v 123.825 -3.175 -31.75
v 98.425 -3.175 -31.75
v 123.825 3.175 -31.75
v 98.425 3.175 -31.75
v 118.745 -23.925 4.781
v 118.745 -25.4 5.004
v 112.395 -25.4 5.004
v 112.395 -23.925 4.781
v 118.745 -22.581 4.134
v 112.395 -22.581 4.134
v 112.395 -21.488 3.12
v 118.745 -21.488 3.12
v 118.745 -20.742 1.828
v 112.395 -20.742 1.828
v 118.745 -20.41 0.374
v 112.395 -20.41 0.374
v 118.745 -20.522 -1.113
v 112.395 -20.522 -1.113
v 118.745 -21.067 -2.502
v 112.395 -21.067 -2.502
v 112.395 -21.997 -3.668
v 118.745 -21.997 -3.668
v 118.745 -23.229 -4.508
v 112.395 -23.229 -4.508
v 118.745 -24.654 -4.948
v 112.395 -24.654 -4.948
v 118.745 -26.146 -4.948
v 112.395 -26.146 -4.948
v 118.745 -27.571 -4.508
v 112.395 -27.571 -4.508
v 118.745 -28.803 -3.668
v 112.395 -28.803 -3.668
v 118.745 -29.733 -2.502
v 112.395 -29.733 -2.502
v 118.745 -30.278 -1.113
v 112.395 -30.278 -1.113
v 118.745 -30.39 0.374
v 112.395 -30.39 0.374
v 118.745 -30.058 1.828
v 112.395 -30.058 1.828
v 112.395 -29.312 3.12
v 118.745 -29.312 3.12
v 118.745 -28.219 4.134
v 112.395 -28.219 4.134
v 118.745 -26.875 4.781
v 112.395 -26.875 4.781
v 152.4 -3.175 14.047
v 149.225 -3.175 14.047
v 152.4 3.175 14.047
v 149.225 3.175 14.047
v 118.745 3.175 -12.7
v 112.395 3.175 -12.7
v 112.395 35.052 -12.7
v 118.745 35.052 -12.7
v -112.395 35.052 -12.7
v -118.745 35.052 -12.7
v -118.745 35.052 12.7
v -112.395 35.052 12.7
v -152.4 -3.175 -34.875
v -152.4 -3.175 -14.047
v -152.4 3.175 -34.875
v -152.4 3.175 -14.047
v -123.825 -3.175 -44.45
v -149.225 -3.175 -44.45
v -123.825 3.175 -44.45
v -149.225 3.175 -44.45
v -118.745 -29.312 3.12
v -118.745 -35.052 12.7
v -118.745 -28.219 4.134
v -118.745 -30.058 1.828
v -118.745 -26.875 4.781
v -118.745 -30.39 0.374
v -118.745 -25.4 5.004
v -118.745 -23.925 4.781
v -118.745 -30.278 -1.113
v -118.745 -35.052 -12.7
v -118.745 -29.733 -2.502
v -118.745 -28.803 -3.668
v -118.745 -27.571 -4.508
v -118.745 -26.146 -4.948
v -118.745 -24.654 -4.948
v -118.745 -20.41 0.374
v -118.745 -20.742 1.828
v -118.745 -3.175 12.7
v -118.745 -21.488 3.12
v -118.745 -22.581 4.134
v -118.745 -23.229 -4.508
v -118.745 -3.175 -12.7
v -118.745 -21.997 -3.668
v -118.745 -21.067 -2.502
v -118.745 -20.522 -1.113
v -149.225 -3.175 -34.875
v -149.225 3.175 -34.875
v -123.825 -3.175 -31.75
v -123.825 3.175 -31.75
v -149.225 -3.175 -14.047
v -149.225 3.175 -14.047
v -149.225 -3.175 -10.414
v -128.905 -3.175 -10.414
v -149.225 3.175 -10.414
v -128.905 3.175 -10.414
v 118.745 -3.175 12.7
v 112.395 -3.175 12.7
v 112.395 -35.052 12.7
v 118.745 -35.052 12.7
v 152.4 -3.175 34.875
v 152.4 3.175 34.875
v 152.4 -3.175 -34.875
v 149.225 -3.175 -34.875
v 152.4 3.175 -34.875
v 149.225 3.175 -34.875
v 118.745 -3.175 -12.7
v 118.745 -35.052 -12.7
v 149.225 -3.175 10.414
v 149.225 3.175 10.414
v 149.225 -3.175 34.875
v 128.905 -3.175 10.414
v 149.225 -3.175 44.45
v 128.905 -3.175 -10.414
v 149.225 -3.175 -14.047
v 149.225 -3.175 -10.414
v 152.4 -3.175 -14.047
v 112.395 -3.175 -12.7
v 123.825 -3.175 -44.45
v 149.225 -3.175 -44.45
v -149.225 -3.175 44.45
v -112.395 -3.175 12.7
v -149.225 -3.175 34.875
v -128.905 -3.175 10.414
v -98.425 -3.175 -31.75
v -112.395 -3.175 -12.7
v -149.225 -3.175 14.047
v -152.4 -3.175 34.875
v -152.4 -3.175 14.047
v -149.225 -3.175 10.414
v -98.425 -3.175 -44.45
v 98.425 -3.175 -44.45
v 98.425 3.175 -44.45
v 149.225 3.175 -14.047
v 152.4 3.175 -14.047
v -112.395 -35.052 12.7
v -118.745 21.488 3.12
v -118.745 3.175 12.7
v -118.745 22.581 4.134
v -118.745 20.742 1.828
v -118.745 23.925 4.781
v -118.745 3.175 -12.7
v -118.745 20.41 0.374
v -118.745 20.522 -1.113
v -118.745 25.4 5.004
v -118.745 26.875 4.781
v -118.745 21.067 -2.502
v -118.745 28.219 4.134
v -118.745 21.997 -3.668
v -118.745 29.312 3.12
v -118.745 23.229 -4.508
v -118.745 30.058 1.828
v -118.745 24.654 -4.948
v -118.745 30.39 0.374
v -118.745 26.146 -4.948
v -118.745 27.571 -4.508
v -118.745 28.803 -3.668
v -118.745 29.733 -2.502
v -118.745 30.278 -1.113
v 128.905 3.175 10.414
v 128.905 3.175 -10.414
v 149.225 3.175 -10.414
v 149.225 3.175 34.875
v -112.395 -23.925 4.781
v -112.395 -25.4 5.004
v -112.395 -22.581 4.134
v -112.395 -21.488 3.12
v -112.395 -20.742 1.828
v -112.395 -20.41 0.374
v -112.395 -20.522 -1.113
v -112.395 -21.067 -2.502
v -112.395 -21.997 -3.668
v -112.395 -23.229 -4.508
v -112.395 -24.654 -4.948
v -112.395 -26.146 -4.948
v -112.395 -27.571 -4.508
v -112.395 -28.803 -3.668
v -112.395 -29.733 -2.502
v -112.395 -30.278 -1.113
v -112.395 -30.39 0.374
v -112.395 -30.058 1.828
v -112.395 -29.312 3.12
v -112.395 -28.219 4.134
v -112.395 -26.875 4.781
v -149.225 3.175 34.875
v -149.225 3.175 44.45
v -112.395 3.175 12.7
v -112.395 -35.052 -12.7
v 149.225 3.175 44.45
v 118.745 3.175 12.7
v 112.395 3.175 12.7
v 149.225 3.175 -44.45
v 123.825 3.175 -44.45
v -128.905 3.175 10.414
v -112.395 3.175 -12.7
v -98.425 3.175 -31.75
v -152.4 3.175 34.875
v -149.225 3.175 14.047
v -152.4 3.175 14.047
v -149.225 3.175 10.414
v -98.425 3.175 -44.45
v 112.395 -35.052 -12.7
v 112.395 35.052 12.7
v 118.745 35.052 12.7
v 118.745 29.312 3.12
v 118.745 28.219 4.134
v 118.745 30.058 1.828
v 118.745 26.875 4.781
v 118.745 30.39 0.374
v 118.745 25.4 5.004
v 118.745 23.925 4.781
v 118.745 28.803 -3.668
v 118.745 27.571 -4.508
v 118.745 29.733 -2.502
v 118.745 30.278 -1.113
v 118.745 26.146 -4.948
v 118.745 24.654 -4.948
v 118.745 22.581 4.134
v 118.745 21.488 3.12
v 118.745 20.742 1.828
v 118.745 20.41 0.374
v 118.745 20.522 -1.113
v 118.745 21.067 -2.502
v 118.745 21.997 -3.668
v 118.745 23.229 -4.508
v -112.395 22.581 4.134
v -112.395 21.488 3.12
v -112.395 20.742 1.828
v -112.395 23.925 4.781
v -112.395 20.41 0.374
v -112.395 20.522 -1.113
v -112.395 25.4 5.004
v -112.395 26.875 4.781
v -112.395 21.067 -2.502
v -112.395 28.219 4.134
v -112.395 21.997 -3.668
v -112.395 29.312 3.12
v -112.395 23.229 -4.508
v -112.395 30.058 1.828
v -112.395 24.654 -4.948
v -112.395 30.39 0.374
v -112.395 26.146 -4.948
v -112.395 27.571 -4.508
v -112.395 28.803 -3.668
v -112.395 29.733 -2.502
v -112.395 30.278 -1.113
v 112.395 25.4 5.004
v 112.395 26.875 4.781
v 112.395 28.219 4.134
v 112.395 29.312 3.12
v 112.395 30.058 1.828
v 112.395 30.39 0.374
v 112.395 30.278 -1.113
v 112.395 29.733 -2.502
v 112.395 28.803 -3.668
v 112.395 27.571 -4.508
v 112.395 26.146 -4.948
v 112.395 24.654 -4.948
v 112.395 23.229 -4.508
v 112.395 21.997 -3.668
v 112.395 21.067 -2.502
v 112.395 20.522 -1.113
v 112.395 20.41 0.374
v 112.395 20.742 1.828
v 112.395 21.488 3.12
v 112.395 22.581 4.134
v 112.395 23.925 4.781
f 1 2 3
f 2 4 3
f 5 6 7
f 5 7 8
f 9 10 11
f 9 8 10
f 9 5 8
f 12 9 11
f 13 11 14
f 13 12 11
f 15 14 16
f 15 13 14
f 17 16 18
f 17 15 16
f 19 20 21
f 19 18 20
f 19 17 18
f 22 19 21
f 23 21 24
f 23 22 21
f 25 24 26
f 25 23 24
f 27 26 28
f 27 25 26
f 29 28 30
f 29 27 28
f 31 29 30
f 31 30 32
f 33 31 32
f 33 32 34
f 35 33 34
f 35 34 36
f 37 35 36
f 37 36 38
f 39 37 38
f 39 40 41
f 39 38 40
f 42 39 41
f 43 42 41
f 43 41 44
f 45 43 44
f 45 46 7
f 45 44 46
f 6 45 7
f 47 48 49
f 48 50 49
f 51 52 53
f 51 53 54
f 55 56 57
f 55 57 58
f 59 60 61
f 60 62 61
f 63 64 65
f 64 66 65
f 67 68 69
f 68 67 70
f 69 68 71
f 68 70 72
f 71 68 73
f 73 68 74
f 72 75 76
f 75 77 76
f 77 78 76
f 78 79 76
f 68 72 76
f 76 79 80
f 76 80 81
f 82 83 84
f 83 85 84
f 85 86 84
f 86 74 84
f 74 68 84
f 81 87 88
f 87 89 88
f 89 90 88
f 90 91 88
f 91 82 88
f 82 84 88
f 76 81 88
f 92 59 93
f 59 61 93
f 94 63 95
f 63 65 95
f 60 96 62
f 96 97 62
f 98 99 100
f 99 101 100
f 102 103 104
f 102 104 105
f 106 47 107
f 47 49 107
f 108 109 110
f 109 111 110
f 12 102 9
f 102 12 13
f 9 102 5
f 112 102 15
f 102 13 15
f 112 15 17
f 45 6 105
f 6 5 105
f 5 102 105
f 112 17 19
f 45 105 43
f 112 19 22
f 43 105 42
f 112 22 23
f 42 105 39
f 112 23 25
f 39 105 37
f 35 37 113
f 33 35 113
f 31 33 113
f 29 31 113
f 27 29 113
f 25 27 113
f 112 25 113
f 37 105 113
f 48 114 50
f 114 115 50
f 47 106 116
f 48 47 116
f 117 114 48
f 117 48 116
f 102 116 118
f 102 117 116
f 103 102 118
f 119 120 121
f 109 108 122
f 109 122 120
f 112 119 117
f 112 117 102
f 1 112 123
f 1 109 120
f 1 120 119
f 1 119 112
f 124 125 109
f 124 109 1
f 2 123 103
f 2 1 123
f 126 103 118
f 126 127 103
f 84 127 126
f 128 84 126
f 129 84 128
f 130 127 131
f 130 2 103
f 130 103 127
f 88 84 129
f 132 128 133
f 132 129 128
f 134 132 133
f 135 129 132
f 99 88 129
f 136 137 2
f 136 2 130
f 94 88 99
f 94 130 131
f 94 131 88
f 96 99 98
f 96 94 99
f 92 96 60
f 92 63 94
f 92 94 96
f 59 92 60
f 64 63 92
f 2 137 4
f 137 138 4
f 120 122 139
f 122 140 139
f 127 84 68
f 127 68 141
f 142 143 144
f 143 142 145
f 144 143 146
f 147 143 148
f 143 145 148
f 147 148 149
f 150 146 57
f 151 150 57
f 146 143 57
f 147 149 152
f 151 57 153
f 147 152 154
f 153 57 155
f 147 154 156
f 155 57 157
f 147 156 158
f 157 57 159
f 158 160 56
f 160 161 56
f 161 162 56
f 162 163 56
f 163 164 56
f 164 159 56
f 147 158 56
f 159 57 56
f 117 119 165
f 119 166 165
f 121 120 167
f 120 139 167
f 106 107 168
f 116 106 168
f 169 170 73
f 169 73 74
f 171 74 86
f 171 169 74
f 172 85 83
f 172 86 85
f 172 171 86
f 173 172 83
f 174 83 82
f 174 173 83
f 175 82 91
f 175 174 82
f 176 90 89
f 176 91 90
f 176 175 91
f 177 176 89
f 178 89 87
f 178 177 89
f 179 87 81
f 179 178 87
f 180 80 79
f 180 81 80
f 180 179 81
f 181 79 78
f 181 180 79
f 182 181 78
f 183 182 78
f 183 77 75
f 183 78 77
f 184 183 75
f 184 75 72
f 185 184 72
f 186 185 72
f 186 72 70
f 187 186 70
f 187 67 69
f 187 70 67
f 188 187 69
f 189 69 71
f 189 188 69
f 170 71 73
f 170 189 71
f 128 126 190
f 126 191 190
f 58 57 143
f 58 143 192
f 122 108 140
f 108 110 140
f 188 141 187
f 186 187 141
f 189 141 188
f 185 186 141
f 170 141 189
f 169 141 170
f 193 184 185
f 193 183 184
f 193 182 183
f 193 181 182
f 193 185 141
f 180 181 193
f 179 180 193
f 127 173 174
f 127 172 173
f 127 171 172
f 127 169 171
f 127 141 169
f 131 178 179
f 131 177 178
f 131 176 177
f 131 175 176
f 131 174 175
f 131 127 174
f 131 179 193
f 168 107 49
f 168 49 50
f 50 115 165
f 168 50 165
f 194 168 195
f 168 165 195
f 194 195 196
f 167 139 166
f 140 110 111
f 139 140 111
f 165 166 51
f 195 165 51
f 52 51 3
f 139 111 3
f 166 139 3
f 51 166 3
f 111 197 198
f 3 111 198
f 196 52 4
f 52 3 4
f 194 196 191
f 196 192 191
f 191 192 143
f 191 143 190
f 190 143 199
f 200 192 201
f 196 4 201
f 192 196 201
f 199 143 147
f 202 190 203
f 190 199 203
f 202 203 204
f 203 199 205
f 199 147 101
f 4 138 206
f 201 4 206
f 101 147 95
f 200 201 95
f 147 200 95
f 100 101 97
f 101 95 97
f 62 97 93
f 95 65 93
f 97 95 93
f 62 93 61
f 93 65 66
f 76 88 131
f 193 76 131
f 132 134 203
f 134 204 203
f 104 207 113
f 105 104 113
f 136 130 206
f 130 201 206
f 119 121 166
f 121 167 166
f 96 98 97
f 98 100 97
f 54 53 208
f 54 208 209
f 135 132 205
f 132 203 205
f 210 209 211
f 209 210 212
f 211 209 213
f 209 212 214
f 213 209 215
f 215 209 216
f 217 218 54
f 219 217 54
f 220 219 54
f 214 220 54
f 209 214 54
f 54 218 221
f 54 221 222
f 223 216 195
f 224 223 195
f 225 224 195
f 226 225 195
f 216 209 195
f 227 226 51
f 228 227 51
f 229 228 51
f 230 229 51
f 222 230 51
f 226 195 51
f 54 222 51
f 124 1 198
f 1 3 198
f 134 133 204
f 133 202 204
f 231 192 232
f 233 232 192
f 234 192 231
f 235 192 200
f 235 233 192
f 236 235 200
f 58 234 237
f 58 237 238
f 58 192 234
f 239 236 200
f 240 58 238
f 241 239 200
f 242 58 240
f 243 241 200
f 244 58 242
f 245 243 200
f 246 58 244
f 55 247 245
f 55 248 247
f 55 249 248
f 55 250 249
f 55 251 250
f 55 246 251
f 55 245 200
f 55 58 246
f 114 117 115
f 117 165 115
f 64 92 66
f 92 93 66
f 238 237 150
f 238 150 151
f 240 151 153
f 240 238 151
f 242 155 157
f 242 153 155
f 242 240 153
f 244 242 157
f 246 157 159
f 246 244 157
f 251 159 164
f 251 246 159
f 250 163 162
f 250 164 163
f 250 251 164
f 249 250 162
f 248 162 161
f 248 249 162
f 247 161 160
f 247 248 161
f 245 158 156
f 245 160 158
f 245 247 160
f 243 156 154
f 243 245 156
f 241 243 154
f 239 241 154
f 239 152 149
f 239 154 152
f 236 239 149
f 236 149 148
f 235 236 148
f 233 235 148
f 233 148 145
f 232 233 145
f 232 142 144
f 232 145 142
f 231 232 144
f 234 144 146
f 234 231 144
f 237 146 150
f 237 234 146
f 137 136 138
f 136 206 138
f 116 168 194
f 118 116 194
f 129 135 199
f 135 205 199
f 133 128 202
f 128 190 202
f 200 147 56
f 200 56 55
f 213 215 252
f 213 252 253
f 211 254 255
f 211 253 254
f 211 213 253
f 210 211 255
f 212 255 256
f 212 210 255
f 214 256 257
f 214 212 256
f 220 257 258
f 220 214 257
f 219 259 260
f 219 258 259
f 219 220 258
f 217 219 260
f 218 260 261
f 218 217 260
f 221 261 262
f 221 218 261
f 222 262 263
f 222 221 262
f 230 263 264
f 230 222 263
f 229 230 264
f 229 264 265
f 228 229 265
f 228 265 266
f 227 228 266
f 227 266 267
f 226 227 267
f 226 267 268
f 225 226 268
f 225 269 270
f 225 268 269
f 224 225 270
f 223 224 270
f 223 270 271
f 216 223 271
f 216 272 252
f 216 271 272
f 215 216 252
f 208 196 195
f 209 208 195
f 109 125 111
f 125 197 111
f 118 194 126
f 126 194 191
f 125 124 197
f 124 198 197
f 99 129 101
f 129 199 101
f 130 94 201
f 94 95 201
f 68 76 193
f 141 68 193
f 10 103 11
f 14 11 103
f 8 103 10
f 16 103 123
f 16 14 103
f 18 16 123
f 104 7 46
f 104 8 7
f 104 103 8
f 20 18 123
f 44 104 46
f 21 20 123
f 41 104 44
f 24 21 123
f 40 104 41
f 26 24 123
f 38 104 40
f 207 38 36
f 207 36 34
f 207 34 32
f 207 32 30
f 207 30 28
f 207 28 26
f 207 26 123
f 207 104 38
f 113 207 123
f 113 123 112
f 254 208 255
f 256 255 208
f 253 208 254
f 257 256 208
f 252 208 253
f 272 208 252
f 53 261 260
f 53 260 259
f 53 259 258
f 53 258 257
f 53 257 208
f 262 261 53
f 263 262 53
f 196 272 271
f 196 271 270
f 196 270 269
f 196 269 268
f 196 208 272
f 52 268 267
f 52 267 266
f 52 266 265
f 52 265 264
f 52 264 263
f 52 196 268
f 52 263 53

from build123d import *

# Parameters (mm, degrees)
BOSS_EXTRUDE1_DEPTH     = 3.175
SKETCH2_W               = 6.35
SKETCH2_H               = 25.4
BOSS_EXTRUDE2_DEPTH     = 35.052
CUT_EXTRUDE1_DEPTH      = 277.991076082
CUT_EXTRUDE1_DEPTH_BACK = 277.991076082
SKETCH5_R               = 5.0038


with BuildPart() as part:
    # Sketch1 → Boss-Extrude1 (new, symmetric)
    with BuildSketch(Plane(origin=(0, 0, 0), x_dir=(1, 0, 0), z_dir=(0, 1, 0))):
        Polygon((149.225, -44.45), (-149.225, -44.45), (-149.225, -34.874677354), (-152.4, -34.874677354), (-152.4, -14.046677354), (-149.225, -14.046677354), (-149.225, -10.414), (-128.905, -10.414), (-128.905, 10.414), (-149.225, 10.414), (-149.225, 14.046677354), (-152.4, 14.046677354), (-152.4, 34.874677354), (-149.225, 34.874677354), (-149.225, 44.45), (-123.825, 44.45), (-123.825, 31.75), (-98.425, 31.75), (-98.425, 44.45), (98.425, 44.45), (98.425, 31.75), (123.825, 31.75), (123.825, 44.45), (149.225, 44.45), (149.225, 34.874677354), (152.4, 34.874677354), (152.4, 14.046677354), (149.225, 14.046677354), (149.225, 10.414), (128.905, 10.414), (128.905, -10.414), (149.225, -10.414), (149.225, -14.046677354), (152.4, -14.046677354), (152.4, -34.874677354), (149.225, -34.874677354), align=None)
    extrude(amount=BOSS_EXTRUDE1_DEPTH, both=True)

    # Sketch2 → Boss-Extrude2 (add, symmetric)
    with BuildSketch(Plane(origin=(0, 0, 0), x_dir=(1, 0, 0), z_dir=(0, 1, 0))):
        with Locations((115.57, 0)):
            Rectangle(SKETCH2_W, SKETCH2_H)
        with Locations((-115.57, 0)):
            Rectangle(SKETCH2_W, SKETCH2_H)
    extrude(amount=BOSS_EXTRUDE2_DEPTH, both=True)

    # Sketch5 → Cut-Extrude1 (cut, two sides: drawn at the far end of the back side and taken through both)
    with BuildSketch(Plane.ZY.offset(118.745).offset(-CUT_EXTRUDE1_DEPTH_BACK)):
        with Locations((0, 25.4)):
            Circle(SKETCH5_R)
        with Locations((0, -25.4)):
            Circle(SKETCH5_R)
    extrude(amount=CUT_EXTRUDE1_DEPTH + CUT_EXTRUDE1_DEPTH_BACK, mode=Mode.SUBTRACT)


solid = part.part
